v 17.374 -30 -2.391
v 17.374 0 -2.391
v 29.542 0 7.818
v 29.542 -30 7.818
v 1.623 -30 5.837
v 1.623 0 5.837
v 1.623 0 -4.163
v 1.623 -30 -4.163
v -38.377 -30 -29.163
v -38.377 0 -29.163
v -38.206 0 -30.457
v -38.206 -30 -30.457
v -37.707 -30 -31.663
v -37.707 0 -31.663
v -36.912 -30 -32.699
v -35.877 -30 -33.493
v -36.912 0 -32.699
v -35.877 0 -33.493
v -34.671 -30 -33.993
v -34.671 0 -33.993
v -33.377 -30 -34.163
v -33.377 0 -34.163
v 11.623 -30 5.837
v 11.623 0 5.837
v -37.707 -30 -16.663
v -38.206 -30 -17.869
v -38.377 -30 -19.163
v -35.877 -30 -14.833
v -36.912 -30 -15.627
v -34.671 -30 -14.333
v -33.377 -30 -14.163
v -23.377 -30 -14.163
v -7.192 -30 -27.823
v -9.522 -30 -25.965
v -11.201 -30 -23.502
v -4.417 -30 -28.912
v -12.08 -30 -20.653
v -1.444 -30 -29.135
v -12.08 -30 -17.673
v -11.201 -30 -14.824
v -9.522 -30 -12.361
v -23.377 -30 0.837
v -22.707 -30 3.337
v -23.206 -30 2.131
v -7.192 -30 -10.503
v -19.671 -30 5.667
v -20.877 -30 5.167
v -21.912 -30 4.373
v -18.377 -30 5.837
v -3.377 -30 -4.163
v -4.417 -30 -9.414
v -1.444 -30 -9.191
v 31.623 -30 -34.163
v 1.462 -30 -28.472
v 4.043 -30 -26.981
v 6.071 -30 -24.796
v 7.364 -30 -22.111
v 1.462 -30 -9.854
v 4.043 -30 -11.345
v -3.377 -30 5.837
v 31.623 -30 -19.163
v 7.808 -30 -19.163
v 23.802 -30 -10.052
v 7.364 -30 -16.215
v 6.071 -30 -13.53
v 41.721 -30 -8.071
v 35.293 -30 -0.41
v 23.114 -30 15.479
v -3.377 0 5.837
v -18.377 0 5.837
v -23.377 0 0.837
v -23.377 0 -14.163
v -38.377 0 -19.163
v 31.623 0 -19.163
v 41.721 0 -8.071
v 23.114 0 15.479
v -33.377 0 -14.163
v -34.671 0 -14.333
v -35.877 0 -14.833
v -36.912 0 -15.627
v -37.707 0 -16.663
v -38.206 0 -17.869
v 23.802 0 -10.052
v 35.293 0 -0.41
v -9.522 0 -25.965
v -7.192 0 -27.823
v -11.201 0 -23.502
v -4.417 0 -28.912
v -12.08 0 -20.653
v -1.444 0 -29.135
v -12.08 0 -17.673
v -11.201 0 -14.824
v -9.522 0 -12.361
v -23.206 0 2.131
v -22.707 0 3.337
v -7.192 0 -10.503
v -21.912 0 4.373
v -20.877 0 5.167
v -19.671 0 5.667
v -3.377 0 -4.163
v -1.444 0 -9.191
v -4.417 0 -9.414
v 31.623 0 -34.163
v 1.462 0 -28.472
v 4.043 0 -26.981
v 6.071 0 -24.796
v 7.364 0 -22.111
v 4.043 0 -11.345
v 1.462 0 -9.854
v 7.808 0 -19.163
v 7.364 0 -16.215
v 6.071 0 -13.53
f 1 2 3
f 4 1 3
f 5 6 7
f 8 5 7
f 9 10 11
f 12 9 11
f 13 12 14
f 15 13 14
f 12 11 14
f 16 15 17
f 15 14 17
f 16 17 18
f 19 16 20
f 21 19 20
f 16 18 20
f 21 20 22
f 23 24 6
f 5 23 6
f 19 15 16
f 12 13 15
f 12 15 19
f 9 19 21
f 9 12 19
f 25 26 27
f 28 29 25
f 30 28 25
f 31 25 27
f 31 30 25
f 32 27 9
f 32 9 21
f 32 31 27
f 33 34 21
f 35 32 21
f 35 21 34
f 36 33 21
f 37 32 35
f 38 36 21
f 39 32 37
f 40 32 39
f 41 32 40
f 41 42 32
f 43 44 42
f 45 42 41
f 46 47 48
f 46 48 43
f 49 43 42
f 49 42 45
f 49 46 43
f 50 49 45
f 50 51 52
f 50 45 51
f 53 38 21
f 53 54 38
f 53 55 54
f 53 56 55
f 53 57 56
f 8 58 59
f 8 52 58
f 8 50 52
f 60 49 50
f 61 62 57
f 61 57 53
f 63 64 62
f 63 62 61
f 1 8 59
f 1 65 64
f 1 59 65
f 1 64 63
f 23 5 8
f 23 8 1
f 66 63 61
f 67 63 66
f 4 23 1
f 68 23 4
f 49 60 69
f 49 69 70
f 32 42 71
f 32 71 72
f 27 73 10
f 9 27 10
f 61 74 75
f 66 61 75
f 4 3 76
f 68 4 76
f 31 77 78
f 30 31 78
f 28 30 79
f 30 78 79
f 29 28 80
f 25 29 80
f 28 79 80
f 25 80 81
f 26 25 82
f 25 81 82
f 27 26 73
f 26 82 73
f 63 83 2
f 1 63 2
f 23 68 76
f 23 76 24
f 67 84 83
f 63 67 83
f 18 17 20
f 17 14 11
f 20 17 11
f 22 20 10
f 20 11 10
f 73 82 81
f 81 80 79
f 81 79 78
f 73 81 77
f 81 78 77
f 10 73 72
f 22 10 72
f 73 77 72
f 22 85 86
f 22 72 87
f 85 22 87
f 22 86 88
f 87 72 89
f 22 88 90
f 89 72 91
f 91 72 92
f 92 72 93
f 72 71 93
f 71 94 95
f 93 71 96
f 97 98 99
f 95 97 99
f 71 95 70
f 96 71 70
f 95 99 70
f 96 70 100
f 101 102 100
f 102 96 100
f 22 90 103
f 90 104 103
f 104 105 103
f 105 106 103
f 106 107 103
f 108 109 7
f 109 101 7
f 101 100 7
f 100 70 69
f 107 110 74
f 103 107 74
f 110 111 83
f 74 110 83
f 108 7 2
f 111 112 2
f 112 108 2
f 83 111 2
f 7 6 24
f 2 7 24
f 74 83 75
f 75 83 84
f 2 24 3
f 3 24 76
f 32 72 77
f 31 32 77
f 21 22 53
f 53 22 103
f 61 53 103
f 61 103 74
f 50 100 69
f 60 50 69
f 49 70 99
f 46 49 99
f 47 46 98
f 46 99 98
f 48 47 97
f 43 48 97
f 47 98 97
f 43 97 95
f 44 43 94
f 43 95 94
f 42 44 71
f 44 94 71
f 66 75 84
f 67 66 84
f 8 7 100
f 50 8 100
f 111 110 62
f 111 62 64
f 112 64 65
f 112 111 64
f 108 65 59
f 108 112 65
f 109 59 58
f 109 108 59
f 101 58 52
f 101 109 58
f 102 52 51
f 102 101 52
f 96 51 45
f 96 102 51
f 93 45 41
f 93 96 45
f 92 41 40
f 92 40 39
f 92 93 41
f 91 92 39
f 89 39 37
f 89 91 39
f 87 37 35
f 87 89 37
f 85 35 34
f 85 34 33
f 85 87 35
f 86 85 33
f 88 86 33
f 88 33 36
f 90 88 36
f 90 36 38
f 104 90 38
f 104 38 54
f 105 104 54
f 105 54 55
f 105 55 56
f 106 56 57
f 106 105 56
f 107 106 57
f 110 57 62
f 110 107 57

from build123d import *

# Parameters (mm, degrees)
F0_R     = 10
F1_DEPTH = 30


with BuildPart() as f1:
    # F0 (on Front) → F1 (new body)
    with BuildSketch(Plane.XZ):
        with BuildLine():
            ThreePointArc((-38.37657, -29.162996), (-36.912104, -32.698529), (-33.37657, -34.162996))
            Line((-33.37657, -34.162996), (31.62343, -34.162996))
            Line((31.62343, -34.162996), (31.62343, -19.162996))
            Line((31.62343, -19.162996), (41.720804, -8.070519))
            Line((41.720804, -8.070519), (35.292928, -0.410074))
            Line((35.292928, -0.410074), (23.802262, -10.051889))
            Line((23.802262, -10.051889), (17.374386, -2.391444))
            Line((17.374386, -2.391444), (29.541973, 7.818374))
            Line((29.541973, 7.818374), (23.114097, 15.478819))
            Line((23.114097, 15.478819), (11.62343, 5.837004))
            Line((11.62343, 5.837004), (1.62343, 5.837004))
            Line((1.62343, 5.837004), (1.62343, -4.162996))
            Line((1.62343, -4.162996), (-3.37657, -4.162996))
            Line((-3.37657, -4.162996), (-3.37657, 5.837004))
            Line((-3.37657, 5.837004), (-18.37657, 5.837004))
            ThreePointArc((-18.37657, 5.837004), (-21.912104, 4.372538), (-23.37657, 0.837004))
            Line((-23.37657, 0.837004), (-23.37657, -14.162996))
            Line((-23.37657, -14.162996), (-33.37657, -14.162996))
            ThreePointArc((-33.37657, -14.162996), (-36.912104, -15.627462), (-38.37657, -19.162996))
            Line((-38.37657, -19.162996), (-38.37657, -29.162996))
        make_face()
        with Locations((-2.191618, -19.162996)):
            Circle(F0_R, mode=Mode.SUBTRACT)
    extrude(amount=F1_DEPTH)


solid = f1.part
